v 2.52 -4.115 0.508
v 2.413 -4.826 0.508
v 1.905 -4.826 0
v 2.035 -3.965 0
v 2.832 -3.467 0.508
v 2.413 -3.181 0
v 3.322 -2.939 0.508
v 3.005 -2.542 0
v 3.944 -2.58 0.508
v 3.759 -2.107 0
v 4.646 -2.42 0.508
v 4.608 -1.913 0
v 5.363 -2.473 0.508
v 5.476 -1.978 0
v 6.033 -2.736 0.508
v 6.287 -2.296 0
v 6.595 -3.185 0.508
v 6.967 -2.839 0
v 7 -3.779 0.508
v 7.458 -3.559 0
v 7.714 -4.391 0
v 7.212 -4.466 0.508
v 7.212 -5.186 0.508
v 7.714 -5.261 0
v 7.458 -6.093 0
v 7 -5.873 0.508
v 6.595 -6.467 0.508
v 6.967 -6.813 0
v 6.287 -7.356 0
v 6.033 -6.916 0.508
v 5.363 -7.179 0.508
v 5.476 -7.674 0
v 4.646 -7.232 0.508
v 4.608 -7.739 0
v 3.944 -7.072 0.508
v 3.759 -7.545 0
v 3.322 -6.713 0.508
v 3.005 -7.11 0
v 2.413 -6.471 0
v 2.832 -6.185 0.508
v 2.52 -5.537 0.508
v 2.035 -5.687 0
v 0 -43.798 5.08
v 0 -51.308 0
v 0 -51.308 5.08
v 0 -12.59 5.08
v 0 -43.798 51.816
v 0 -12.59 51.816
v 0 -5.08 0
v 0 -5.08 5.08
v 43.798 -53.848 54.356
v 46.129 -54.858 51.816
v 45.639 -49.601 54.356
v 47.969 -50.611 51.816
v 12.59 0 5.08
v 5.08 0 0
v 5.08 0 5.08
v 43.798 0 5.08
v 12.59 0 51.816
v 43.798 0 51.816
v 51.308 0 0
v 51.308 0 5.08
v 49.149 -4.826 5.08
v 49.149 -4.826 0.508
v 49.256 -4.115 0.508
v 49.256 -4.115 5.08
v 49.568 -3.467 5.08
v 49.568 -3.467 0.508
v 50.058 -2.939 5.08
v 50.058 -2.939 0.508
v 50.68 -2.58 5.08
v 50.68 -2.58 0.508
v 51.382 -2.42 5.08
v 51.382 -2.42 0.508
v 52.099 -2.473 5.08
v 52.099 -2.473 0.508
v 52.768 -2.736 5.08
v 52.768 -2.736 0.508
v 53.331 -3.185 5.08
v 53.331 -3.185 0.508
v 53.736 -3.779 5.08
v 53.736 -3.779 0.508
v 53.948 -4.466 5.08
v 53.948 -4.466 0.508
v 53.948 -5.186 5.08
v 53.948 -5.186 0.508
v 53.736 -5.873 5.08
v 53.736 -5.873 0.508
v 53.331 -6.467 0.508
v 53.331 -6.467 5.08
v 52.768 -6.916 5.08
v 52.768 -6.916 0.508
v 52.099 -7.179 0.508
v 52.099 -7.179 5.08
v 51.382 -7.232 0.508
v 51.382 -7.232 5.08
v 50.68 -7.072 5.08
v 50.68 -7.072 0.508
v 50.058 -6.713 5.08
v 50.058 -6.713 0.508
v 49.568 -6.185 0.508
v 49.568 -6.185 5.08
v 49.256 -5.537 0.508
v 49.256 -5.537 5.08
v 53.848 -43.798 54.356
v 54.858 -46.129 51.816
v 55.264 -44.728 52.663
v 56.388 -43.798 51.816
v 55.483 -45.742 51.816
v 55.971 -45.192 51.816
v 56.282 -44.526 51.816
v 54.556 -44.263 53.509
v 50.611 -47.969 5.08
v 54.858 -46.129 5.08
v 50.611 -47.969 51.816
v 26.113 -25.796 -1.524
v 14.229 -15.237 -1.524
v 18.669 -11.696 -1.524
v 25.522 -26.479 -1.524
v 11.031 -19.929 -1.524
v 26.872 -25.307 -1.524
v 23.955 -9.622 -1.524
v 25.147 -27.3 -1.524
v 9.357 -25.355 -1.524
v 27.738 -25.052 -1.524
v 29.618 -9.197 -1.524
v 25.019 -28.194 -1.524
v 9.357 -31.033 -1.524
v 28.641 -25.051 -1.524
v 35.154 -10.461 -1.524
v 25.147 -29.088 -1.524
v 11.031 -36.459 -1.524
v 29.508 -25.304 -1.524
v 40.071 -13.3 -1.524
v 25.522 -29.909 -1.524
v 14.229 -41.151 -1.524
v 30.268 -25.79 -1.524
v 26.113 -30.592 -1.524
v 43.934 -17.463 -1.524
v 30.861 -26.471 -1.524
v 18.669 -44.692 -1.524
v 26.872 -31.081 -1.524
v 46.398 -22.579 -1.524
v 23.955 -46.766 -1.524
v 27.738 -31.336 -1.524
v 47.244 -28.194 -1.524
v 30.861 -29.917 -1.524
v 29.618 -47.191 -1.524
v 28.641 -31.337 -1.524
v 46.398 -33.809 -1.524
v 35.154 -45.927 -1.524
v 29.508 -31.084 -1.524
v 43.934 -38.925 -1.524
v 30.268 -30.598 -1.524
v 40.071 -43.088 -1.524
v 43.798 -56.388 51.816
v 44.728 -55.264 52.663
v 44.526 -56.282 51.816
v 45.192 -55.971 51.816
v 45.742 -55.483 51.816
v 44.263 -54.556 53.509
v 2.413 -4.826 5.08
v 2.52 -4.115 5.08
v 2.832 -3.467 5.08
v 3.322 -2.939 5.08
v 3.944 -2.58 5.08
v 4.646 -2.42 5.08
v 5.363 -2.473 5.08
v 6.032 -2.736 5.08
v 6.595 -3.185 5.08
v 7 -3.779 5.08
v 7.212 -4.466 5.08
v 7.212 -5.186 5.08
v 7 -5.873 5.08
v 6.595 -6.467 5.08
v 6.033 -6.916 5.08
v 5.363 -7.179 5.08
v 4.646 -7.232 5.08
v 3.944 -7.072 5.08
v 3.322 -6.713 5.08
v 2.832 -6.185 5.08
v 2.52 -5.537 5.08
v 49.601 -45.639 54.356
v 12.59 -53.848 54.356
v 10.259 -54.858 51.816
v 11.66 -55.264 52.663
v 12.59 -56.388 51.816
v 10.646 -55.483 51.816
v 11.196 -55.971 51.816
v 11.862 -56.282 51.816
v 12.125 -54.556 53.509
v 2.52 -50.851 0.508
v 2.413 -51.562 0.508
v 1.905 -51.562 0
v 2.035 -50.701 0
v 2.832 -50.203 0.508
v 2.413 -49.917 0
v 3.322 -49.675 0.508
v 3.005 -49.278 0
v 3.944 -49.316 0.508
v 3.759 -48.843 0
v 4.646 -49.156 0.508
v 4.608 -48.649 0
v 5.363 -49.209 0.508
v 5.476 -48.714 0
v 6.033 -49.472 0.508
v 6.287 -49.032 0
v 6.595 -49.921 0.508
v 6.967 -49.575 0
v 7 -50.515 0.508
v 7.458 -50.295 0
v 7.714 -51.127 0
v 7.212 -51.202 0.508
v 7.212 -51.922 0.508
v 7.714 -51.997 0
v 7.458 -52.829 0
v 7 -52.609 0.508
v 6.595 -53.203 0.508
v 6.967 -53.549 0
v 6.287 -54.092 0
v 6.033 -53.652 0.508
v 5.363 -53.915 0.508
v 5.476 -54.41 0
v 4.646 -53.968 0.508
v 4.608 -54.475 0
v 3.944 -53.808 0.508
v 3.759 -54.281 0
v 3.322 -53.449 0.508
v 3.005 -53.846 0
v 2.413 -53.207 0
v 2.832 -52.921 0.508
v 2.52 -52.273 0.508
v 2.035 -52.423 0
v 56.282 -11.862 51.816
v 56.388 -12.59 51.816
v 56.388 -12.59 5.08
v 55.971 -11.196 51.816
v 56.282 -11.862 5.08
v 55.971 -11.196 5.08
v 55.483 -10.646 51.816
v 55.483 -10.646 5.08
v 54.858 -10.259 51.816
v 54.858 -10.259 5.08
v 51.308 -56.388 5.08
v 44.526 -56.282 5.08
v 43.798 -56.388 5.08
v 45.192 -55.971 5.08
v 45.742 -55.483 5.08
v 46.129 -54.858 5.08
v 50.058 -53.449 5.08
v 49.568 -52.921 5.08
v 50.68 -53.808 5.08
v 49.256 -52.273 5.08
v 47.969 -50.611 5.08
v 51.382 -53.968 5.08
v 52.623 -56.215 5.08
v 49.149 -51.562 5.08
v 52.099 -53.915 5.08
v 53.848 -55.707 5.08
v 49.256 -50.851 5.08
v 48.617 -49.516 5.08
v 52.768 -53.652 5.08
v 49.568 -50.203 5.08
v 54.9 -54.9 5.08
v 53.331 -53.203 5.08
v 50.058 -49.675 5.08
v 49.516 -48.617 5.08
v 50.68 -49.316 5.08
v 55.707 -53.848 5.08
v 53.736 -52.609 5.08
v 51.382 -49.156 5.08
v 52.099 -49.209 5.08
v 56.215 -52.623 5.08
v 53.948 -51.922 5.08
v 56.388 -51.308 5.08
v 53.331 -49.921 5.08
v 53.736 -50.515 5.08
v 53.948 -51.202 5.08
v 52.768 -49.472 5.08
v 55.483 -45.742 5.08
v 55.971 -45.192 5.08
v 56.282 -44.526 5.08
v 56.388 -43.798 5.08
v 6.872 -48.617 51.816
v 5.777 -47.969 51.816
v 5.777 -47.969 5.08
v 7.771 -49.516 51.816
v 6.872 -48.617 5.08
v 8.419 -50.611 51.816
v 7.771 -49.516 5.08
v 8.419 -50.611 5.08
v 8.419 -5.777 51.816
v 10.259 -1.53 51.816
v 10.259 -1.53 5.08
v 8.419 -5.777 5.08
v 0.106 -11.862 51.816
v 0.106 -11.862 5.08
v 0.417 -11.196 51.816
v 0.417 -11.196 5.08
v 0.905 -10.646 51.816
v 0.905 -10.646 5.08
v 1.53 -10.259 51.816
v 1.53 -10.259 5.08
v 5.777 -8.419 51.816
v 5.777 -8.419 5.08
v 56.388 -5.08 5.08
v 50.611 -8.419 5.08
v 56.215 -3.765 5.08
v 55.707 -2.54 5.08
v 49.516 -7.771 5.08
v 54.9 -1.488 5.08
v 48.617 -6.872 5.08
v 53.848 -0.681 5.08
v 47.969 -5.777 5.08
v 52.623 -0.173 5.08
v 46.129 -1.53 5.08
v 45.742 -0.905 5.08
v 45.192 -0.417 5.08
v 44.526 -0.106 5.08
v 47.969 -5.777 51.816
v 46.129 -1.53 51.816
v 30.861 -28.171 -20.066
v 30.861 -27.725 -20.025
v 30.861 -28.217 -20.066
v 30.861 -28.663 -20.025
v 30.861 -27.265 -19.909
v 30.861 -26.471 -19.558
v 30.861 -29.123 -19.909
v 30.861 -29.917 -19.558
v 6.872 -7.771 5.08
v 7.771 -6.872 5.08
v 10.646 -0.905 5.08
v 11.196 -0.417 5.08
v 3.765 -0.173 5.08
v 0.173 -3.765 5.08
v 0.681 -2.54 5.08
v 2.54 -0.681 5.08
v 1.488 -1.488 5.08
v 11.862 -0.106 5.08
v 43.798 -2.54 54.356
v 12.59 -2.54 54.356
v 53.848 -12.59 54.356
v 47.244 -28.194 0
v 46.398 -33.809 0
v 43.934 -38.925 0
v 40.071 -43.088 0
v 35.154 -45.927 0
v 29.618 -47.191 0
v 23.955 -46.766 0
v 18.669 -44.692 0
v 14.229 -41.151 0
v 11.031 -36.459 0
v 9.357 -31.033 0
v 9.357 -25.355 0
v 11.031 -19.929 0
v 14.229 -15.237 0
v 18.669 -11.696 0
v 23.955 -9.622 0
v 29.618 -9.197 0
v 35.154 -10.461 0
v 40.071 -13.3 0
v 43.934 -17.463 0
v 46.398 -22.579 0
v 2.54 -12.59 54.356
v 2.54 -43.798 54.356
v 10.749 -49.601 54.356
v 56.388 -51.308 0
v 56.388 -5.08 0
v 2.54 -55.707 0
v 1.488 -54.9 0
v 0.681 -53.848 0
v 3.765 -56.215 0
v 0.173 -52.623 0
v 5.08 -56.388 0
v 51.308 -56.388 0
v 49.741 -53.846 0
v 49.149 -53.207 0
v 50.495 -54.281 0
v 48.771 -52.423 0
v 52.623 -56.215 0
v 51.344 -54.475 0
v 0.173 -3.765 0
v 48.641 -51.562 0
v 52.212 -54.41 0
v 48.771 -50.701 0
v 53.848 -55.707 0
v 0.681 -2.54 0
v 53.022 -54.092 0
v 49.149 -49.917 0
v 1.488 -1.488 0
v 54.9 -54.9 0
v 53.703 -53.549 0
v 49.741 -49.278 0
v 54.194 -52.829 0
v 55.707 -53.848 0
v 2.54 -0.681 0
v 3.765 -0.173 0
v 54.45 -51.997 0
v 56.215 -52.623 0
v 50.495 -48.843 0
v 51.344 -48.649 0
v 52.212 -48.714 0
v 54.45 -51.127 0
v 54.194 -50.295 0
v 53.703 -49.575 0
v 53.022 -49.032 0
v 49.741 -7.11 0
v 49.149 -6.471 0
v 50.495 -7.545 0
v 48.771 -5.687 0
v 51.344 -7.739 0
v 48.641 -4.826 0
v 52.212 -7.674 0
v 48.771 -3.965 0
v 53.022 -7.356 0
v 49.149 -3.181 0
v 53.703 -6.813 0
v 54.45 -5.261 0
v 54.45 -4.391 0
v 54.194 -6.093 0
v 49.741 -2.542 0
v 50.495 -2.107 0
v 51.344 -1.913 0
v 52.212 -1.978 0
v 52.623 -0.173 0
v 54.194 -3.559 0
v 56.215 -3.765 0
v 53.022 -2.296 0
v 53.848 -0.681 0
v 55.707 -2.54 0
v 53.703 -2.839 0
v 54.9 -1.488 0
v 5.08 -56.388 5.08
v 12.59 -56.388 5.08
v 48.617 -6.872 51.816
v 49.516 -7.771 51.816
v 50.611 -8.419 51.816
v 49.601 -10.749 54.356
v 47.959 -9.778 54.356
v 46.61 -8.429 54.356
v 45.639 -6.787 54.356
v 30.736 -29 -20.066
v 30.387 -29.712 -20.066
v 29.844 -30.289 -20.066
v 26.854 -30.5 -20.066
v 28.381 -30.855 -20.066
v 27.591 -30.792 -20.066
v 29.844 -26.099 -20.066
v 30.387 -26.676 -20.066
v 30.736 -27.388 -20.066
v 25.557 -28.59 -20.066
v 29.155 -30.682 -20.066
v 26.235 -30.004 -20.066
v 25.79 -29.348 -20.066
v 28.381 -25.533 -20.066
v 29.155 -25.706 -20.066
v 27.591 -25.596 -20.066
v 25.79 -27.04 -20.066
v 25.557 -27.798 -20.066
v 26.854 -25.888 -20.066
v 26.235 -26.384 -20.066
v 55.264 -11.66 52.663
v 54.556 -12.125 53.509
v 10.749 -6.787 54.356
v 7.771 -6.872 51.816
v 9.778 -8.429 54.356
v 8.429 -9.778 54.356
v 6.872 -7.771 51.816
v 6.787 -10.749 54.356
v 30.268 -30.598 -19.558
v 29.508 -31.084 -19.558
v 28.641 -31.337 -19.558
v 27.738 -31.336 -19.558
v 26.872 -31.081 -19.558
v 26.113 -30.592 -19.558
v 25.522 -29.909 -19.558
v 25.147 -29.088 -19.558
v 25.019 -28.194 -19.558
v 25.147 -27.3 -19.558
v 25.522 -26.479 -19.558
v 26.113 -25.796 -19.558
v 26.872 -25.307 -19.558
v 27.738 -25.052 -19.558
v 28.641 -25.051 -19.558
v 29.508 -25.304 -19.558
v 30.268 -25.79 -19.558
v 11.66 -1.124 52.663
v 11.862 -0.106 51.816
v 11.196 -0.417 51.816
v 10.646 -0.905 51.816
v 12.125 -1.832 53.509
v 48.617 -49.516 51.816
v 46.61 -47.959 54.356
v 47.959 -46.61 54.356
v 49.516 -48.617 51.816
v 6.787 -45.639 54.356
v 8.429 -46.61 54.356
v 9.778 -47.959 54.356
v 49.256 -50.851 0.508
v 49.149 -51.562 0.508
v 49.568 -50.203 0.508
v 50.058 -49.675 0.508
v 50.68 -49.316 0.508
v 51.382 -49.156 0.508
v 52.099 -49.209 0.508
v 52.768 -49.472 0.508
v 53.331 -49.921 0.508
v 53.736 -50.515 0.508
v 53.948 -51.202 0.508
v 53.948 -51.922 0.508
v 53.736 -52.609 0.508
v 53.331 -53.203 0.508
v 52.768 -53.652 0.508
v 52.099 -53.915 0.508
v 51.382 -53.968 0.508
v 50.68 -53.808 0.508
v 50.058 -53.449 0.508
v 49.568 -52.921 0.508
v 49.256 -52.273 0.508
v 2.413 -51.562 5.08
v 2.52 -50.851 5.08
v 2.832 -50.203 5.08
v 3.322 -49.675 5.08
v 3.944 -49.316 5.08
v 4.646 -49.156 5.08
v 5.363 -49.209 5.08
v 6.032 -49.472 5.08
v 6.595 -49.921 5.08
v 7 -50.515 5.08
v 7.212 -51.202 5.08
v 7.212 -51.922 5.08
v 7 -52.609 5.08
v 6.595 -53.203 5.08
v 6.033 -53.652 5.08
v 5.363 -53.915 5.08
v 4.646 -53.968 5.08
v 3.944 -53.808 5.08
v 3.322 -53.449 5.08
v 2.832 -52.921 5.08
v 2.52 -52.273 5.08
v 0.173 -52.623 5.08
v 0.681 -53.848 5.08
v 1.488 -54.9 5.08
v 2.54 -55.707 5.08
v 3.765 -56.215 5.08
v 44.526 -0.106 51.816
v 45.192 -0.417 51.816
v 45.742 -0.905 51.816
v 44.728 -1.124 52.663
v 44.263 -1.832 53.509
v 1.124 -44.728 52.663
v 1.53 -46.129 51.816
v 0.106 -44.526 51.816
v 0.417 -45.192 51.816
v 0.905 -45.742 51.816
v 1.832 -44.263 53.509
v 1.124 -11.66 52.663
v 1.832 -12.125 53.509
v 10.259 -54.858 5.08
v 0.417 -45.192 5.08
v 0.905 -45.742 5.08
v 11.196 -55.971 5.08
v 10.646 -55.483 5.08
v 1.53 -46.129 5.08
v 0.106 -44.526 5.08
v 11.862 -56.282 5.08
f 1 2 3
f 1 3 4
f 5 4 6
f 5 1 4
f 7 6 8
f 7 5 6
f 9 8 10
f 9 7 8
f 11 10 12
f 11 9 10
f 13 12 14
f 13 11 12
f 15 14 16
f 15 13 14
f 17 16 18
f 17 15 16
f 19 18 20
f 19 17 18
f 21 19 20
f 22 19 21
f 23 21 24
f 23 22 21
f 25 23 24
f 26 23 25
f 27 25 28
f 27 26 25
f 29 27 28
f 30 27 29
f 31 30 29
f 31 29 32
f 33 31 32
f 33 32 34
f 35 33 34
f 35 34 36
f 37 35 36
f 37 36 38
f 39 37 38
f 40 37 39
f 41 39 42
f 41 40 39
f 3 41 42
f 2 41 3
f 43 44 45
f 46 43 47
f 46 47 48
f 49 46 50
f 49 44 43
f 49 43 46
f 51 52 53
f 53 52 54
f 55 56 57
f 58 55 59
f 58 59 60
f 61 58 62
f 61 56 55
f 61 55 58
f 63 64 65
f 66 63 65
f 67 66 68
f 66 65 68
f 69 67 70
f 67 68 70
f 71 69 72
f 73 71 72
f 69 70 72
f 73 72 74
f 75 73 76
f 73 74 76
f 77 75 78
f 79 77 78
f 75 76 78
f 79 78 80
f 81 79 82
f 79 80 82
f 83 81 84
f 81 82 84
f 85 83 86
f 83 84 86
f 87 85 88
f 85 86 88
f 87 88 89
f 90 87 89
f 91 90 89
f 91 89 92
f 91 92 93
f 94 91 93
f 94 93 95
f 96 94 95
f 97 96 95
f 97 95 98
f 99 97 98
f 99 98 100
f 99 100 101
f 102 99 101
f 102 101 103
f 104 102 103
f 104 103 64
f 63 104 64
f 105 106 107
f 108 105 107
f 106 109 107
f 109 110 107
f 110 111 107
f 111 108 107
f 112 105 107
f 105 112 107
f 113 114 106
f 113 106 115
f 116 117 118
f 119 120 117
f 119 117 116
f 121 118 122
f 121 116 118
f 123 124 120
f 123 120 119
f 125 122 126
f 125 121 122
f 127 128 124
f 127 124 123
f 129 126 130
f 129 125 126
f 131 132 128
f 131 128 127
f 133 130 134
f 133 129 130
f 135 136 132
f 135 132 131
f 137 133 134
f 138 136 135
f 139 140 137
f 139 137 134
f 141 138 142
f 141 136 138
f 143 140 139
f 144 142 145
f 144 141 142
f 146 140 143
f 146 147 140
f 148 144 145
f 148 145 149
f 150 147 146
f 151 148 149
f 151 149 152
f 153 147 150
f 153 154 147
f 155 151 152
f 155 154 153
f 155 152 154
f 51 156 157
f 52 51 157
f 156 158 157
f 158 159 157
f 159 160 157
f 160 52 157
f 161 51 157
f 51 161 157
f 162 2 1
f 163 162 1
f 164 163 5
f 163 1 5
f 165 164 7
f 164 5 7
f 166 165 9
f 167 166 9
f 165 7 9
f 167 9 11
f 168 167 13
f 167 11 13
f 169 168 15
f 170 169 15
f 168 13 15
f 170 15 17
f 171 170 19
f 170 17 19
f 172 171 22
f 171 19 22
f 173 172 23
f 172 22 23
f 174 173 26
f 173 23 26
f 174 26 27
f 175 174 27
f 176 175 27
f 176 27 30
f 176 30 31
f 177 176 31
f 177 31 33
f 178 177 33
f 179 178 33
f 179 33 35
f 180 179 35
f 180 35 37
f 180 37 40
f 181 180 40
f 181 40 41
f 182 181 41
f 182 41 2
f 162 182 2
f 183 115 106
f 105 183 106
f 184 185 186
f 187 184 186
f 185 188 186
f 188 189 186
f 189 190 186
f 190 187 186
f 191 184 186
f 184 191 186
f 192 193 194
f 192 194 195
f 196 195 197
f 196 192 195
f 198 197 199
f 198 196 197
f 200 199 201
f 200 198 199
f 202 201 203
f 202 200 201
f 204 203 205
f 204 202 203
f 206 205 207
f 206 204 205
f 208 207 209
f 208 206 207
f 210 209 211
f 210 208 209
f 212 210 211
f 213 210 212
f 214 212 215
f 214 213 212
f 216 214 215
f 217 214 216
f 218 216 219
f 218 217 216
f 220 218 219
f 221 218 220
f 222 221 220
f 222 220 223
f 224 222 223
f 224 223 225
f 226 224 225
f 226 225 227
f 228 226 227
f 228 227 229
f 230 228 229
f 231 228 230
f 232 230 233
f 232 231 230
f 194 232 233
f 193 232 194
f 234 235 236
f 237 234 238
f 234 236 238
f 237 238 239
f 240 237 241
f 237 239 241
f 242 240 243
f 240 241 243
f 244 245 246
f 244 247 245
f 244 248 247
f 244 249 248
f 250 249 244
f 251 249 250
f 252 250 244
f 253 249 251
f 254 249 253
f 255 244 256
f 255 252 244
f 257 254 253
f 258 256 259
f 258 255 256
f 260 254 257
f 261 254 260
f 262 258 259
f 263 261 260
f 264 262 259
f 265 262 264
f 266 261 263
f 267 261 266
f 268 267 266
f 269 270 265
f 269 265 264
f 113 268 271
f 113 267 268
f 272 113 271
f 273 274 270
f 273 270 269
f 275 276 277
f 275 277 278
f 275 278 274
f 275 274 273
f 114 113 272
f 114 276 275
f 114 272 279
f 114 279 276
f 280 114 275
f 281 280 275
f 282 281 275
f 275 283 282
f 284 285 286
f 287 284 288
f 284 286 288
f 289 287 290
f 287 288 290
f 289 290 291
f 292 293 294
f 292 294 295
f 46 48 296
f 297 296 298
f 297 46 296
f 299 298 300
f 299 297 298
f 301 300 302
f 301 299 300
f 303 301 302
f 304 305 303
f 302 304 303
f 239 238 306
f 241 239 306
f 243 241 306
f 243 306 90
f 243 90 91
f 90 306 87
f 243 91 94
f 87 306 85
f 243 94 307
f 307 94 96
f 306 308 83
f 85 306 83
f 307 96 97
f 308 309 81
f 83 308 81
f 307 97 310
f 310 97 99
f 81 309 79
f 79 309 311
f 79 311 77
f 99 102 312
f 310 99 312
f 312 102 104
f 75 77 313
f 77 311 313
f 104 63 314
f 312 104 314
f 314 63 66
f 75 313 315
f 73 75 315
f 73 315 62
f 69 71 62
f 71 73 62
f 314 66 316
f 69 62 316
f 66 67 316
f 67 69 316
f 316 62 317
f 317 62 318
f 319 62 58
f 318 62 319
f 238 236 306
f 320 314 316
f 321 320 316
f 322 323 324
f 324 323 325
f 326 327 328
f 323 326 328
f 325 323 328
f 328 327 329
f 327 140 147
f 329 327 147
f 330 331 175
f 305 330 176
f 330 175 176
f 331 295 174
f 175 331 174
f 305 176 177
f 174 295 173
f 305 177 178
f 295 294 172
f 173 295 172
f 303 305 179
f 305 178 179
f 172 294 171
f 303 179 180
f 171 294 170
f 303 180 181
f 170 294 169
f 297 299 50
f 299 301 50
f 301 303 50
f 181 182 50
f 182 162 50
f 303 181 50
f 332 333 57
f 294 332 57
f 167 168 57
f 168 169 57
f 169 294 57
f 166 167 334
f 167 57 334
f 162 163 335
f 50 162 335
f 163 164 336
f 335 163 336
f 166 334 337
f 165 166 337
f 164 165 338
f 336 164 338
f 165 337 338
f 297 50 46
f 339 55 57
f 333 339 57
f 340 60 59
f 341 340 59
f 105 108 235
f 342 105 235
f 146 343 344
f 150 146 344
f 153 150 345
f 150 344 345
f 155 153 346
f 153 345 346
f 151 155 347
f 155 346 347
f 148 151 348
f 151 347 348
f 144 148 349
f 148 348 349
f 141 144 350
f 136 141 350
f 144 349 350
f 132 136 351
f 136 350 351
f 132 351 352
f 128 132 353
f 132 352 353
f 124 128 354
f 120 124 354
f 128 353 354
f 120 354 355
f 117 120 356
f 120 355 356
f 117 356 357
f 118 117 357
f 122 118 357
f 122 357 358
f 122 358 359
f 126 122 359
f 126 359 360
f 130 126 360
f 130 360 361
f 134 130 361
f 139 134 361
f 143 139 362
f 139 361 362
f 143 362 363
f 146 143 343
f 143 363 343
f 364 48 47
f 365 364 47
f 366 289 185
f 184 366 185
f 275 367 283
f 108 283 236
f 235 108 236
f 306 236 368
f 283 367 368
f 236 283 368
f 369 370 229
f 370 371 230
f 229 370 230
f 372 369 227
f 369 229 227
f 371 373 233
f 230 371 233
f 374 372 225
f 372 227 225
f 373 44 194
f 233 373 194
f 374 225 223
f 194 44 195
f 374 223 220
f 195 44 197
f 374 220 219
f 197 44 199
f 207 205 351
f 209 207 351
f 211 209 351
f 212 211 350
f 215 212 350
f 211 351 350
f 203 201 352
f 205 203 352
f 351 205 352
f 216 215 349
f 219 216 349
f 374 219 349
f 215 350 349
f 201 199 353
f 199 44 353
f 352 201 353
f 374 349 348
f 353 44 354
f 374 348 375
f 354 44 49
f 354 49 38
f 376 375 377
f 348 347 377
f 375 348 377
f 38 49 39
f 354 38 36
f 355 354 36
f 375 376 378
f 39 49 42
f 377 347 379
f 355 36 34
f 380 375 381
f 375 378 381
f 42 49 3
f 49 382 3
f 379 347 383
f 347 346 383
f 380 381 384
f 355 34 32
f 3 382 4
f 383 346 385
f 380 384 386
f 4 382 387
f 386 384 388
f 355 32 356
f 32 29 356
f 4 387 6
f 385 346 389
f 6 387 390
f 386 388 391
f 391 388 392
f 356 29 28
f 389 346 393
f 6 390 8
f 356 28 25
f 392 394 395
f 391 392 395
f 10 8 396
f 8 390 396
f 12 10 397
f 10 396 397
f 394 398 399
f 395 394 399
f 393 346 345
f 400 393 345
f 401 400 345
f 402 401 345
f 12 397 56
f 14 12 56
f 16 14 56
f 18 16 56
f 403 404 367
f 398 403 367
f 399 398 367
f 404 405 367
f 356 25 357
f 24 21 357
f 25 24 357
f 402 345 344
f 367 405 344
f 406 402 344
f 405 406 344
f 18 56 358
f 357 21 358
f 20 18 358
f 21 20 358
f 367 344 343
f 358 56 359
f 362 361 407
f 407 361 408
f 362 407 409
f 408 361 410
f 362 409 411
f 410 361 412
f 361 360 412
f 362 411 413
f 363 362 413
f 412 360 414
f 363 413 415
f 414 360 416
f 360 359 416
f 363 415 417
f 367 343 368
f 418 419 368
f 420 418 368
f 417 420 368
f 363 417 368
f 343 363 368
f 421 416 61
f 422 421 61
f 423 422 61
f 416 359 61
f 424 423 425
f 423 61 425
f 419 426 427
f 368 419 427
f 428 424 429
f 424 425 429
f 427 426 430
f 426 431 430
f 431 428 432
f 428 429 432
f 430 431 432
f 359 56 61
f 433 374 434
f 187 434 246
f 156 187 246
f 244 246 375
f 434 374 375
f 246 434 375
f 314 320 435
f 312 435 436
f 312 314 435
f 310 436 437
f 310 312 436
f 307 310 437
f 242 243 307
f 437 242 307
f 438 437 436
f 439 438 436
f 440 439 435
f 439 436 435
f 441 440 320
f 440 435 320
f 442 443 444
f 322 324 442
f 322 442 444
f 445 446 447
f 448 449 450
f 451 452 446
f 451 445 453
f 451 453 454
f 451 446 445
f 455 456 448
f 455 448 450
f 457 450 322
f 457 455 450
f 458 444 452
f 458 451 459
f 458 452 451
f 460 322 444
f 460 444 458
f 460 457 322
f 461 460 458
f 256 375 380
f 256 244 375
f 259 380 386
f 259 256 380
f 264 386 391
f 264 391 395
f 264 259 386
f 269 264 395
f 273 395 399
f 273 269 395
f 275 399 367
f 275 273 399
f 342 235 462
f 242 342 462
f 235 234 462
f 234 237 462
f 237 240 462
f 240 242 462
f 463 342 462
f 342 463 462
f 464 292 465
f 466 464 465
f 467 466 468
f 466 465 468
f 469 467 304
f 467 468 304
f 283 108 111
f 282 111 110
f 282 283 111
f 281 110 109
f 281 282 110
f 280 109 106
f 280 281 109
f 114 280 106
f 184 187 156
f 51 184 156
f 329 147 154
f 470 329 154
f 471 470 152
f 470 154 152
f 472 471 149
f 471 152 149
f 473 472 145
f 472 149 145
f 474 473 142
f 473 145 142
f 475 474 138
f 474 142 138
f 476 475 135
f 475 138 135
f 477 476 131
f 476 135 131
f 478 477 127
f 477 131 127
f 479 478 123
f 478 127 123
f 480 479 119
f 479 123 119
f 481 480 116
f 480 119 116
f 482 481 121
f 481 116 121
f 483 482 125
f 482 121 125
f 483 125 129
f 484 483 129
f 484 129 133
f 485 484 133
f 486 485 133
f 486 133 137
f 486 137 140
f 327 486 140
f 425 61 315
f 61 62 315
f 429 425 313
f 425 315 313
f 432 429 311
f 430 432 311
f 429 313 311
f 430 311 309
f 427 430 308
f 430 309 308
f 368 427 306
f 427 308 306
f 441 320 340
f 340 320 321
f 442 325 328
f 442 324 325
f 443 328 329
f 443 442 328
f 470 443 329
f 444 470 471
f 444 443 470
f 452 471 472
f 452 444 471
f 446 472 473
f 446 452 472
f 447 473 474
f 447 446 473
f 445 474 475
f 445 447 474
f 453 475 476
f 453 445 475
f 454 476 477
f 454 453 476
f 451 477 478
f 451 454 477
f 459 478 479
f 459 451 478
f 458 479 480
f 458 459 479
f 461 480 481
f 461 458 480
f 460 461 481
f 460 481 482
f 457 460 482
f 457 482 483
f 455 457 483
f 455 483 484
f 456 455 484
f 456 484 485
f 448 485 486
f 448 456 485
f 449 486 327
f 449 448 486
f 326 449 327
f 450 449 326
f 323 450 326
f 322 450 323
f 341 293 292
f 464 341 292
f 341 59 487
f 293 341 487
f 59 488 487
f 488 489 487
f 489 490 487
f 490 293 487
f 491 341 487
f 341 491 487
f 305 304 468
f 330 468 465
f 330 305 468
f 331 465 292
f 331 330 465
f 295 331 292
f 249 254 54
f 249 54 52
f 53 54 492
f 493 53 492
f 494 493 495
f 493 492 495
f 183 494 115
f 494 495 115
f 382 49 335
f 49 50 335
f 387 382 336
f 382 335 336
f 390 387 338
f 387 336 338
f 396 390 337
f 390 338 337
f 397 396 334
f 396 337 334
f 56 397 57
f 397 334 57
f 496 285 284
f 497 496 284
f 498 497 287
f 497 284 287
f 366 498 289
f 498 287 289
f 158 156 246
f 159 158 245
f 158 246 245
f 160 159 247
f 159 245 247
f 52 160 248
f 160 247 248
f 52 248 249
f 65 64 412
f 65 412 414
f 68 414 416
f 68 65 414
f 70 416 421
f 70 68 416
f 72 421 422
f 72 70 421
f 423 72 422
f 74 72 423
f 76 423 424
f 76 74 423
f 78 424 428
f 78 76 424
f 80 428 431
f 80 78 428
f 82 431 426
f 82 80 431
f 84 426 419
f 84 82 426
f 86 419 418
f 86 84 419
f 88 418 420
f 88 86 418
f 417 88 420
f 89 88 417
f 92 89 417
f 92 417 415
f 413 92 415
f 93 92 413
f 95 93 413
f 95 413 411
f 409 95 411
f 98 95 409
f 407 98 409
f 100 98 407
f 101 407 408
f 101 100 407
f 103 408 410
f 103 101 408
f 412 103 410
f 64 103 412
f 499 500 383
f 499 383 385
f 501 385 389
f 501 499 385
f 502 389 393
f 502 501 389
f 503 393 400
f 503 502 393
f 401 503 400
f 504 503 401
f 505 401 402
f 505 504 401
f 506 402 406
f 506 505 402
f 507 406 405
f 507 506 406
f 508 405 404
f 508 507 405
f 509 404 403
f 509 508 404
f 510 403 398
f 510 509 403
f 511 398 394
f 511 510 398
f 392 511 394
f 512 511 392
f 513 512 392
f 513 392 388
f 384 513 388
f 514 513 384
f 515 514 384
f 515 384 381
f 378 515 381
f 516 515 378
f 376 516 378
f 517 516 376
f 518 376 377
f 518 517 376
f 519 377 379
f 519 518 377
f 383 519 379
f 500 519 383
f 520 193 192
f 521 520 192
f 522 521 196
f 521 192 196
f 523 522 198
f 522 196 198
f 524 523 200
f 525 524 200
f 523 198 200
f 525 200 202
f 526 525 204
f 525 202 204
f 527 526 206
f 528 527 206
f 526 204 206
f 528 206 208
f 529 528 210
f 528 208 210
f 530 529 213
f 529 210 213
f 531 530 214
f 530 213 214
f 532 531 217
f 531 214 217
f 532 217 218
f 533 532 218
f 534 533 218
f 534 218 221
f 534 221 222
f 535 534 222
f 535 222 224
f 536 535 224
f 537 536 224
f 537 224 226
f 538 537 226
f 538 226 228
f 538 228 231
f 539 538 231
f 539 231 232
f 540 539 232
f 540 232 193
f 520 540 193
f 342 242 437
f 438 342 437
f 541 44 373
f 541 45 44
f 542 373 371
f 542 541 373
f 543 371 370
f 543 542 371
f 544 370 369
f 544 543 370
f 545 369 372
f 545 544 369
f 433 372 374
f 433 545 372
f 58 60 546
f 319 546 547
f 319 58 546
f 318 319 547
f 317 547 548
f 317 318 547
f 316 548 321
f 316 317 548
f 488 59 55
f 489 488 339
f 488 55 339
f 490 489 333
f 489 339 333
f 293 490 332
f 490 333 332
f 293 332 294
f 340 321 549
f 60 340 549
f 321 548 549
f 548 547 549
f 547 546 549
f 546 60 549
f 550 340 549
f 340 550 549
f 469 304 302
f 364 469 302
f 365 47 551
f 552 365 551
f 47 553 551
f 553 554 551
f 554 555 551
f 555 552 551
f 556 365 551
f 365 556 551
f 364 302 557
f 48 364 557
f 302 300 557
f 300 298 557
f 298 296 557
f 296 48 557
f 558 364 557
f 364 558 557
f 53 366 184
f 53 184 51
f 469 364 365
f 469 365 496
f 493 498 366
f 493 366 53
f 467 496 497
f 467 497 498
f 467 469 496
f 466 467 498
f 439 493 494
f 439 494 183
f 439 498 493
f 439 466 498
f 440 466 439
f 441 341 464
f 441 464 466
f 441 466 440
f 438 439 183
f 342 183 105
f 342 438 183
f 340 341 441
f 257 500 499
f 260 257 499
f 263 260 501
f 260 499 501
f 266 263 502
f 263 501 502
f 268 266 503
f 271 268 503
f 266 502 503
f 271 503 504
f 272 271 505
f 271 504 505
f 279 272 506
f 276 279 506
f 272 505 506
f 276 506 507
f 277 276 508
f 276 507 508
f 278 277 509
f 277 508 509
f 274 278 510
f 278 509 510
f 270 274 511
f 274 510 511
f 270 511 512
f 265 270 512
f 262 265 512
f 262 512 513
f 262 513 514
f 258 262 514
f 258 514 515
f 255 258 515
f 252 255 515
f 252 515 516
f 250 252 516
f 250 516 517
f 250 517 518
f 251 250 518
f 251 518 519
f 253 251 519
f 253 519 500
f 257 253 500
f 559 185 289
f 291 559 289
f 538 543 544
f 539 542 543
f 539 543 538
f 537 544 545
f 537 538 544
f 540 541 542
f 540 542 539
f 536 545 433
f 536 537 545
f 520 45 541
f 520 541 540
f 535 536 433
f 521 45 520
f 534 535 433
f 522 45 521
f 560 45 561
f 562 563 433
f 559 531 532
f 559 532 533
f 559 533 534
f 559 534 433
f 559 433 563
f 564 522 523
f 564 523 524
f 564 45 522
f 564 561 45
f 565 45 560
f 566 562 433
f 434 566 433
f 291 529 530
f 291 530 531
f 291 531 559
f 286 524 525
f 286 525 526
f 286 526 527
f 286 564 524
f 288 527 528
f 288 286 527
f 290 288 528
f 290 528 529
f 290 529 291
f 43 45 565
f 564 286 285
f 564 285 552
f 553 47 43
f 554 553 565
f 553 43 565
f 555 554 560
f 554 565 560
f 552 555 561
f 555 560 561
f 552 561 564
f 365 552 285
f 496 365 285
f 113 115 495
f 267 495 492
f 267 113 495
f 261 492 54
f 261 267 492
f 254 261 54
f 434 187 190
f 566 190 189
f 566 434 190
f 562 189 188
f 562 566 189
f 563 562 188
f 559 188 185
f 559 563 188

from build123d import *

# Parameters (mm, degrees)
SKETCH1_W           = 56.388
SKETCH1_H           = 56.388
BOSS_EXTRUDE1_DEPTH = 54.356
CUT_EXTRUDE1_DEPTH  = 49.276
FILLET2_R           = 5.08
FILLET3_R           = 2.54
SKETCH6_R           = 19.05
BOSS_EXTRUDE2_DEPTH = 1.524
BOSS_EXTRUDE3_DEPTH = 18.542
SKETCH10_R          = 2.413
CUT_EXTRUDE2_DEPTH  = 18.542
CHAMFER1_SIZE       = 0.508
CHAMFER2_SIZE       = 0.508
CHAMFER3_SIZE       = 2.54


with BuildPart() as part:
    # Sketch1 → Boss-Extrude1 (new body)
    with BuildSketch(Plane.XY):
        with Locations((28.194, -28.194)):
            Rectangle(SKETCH1_W, SKETCH1_H)
    extrude(amount=BOSS_EXTRUDE1_DEPTH)

    # Sketch3 → Cut-Extrude1 (cut)
    with BuildSketch(Plane.XY.offset(54.356)):
        Polygon((0, 0), (10.922, 0), (7.62, -7.62), (0, -10.922), align=None)
        Polygon((56.388, 0), (56.388, -10.922), (48.768, -7.62), (45.466, 0), align=None)
        Polygon((0, -56.388), (10.922, -56.388), (7.62, -48.768), (0, -45.466), align=None)
        Polygon((56.388, -56.388), (56.388, -45.466), (48.768, -48.768), (45.466, -56.388), align=None)
    extrude(amount=-CUT_EXTRUDE1_DEPTH, mode=Mode.SUBTRACT)

    # Fillet2
    fillet2_edges = [part.edges().sort_by_distance(p)[0] for p in [
        (0, 0, 2.54),
        (7.62, -7.62, 29.718),
        (56.388, 0, 2.54),
        (48.768, -7.62, 29.718),
        (0, -56.388, 2.54),
        (7.62, -48.768, 29.718),
        (56.388, -56.388, 2.54),
        (48.768, -48.768, 29.718),
    ]]
    fillet(fillet2_edges, radius=FILLET2_R)

    # Fillet3
    fillet3_edges = [part.edges().sort_by_distance(p)[0] for p in [
        (0, -10.922, 29.718),
        (10.922, 0, 29.718),
        (45.466, 0, 29.718),
        (56.388, -10.922, 29.718),
        (0, -45.466, 29.718),
        (10.922, -56.388, 29.718),
        (45.466, -56.388, 29.718),
        (56.388, -45.466, 29.718),
    ]]
    fillet(fillet3_edges, radius=FILLET3_R)

    # Sketch6 → Boss-Extrude2 (add)
    with BuildSketch(Plane(origin=(0, 0, 0), x_dir=(-1, 0, 0), z_dir=(0, 0, -1))):
        with Locations(Location((-28.194, -28.194, 0), (0, 0, 180))):
            Circle(SKETCH6_R)
    extrude(amount=BOSS_EXTRUDE2_DEPTH)

    # Sketch8 → Boss-Extrude3 (add)
    with BuildSketch(Plane(origin=(0, 0, -1.524), x_dir=(-1, 0, 0), z_dir=(0, 0, -1))):
        with BuildLine():
            Line((-30.861, -26.471288184), (-30.861, -29.916711816))
            ThreePointArc((-30.861, -29.916711816), (-25.019, -28.194), (-30.861, -26.471288184))
        make_face()
    extrude(amount=BOSS_EXTRUDE3_DEPTH)

    # Sketch10 → Cut-Extrude2 (cut)
    with BuildSketch(Plane(origin=(0, 0, 0), x_dir=(-1, 0, 0), z_dir=(0, 0, -1))):
        with Locations((-51.562, -4.826)):
            Circle(SKETCH10_R)
        with Locations((-4.826, -4.826)):
            Circle(SKETCH10_R)
        with Locations((-51.562, -51.562)):
            Circle(SKETCH10_R)
        with Locations((-4.826, -51.562)):
            Circle(SKETCH10_R)
    extrude(amount=-CUT_EXTRUDE2_DEPTH, mode=Mode.SUBTRACT)

    # Chamfer1
    chamfer1_edges = [part.edges().sort_by_distance(p)[0] for p in [
        (53.975, -4.826, 0),
        (7.239, -4.826, 0),
        (53.975, -51.562, 0),
        (7.239, -51.562, 0),
    ]]
    chamfer(chamfer1_edges, length=CHAMFER1_SIZE)

    # Chamfer2
    chamfer2_edges = [part.edges().sort_by_distance(p)[0] for p in [
        (25.019, -28.194, -20.066),
    ]]
    chamfer(chamfer2_edges, length=CHAMFER2_SIZE - 0.0001)  # a hair under: the kernel refuses the full size

    # Chamfer3
    chamfer3_edges = [part.edges().sort_by_distance(p)[0] for p in [
        (47.049244866, -3.653641998, 54.356),
        (52.734358002, -47.049244866, 54.356),
        (56.388, -28.194, 54.356),
        (28.194, 0, 54.356),
        (3.653641998, -9.338755134, 54.356),
        (0, -28.194, 54.356),
        (9.338755134, -52.734358002, 54.356),
        (28.194, -56.388, 54.356),
        (0.416700193, -11.19557153, 54.356),
        (11.19557153, -0.416700193, 54.356),
        (0.416700193, -45.19242847, 54.356),
        (11.19557153, -55.971299807, 54.356),
        (45.19242847, -55.971299807, 54.356),
        (55.971299807, -45.19242847, 54.356),
        (55.971299807, -11.19557153, 54.356),
        (45.19242847, -0.416700193, 54.356),
        (3.653641998, -47.049244866, 54.356),
        (47.049244866, -52.734358002, 54.356),
        (52.734358002, -9.338755134, 54.356),
        (9.338755134, -3.653641998, 54.356),
        (7.349463554, -49.038536446, 54.356),
        (49.038536446, -49.038536446, 54.356),
        (49.038536446, -7.349463554, 54.356),
        (7.349463554, -7.349463554, 54.356),
    ]]
    chamfer(chamfer3_edges, length=CHAMFER3_SIZE)


solid = part.part
